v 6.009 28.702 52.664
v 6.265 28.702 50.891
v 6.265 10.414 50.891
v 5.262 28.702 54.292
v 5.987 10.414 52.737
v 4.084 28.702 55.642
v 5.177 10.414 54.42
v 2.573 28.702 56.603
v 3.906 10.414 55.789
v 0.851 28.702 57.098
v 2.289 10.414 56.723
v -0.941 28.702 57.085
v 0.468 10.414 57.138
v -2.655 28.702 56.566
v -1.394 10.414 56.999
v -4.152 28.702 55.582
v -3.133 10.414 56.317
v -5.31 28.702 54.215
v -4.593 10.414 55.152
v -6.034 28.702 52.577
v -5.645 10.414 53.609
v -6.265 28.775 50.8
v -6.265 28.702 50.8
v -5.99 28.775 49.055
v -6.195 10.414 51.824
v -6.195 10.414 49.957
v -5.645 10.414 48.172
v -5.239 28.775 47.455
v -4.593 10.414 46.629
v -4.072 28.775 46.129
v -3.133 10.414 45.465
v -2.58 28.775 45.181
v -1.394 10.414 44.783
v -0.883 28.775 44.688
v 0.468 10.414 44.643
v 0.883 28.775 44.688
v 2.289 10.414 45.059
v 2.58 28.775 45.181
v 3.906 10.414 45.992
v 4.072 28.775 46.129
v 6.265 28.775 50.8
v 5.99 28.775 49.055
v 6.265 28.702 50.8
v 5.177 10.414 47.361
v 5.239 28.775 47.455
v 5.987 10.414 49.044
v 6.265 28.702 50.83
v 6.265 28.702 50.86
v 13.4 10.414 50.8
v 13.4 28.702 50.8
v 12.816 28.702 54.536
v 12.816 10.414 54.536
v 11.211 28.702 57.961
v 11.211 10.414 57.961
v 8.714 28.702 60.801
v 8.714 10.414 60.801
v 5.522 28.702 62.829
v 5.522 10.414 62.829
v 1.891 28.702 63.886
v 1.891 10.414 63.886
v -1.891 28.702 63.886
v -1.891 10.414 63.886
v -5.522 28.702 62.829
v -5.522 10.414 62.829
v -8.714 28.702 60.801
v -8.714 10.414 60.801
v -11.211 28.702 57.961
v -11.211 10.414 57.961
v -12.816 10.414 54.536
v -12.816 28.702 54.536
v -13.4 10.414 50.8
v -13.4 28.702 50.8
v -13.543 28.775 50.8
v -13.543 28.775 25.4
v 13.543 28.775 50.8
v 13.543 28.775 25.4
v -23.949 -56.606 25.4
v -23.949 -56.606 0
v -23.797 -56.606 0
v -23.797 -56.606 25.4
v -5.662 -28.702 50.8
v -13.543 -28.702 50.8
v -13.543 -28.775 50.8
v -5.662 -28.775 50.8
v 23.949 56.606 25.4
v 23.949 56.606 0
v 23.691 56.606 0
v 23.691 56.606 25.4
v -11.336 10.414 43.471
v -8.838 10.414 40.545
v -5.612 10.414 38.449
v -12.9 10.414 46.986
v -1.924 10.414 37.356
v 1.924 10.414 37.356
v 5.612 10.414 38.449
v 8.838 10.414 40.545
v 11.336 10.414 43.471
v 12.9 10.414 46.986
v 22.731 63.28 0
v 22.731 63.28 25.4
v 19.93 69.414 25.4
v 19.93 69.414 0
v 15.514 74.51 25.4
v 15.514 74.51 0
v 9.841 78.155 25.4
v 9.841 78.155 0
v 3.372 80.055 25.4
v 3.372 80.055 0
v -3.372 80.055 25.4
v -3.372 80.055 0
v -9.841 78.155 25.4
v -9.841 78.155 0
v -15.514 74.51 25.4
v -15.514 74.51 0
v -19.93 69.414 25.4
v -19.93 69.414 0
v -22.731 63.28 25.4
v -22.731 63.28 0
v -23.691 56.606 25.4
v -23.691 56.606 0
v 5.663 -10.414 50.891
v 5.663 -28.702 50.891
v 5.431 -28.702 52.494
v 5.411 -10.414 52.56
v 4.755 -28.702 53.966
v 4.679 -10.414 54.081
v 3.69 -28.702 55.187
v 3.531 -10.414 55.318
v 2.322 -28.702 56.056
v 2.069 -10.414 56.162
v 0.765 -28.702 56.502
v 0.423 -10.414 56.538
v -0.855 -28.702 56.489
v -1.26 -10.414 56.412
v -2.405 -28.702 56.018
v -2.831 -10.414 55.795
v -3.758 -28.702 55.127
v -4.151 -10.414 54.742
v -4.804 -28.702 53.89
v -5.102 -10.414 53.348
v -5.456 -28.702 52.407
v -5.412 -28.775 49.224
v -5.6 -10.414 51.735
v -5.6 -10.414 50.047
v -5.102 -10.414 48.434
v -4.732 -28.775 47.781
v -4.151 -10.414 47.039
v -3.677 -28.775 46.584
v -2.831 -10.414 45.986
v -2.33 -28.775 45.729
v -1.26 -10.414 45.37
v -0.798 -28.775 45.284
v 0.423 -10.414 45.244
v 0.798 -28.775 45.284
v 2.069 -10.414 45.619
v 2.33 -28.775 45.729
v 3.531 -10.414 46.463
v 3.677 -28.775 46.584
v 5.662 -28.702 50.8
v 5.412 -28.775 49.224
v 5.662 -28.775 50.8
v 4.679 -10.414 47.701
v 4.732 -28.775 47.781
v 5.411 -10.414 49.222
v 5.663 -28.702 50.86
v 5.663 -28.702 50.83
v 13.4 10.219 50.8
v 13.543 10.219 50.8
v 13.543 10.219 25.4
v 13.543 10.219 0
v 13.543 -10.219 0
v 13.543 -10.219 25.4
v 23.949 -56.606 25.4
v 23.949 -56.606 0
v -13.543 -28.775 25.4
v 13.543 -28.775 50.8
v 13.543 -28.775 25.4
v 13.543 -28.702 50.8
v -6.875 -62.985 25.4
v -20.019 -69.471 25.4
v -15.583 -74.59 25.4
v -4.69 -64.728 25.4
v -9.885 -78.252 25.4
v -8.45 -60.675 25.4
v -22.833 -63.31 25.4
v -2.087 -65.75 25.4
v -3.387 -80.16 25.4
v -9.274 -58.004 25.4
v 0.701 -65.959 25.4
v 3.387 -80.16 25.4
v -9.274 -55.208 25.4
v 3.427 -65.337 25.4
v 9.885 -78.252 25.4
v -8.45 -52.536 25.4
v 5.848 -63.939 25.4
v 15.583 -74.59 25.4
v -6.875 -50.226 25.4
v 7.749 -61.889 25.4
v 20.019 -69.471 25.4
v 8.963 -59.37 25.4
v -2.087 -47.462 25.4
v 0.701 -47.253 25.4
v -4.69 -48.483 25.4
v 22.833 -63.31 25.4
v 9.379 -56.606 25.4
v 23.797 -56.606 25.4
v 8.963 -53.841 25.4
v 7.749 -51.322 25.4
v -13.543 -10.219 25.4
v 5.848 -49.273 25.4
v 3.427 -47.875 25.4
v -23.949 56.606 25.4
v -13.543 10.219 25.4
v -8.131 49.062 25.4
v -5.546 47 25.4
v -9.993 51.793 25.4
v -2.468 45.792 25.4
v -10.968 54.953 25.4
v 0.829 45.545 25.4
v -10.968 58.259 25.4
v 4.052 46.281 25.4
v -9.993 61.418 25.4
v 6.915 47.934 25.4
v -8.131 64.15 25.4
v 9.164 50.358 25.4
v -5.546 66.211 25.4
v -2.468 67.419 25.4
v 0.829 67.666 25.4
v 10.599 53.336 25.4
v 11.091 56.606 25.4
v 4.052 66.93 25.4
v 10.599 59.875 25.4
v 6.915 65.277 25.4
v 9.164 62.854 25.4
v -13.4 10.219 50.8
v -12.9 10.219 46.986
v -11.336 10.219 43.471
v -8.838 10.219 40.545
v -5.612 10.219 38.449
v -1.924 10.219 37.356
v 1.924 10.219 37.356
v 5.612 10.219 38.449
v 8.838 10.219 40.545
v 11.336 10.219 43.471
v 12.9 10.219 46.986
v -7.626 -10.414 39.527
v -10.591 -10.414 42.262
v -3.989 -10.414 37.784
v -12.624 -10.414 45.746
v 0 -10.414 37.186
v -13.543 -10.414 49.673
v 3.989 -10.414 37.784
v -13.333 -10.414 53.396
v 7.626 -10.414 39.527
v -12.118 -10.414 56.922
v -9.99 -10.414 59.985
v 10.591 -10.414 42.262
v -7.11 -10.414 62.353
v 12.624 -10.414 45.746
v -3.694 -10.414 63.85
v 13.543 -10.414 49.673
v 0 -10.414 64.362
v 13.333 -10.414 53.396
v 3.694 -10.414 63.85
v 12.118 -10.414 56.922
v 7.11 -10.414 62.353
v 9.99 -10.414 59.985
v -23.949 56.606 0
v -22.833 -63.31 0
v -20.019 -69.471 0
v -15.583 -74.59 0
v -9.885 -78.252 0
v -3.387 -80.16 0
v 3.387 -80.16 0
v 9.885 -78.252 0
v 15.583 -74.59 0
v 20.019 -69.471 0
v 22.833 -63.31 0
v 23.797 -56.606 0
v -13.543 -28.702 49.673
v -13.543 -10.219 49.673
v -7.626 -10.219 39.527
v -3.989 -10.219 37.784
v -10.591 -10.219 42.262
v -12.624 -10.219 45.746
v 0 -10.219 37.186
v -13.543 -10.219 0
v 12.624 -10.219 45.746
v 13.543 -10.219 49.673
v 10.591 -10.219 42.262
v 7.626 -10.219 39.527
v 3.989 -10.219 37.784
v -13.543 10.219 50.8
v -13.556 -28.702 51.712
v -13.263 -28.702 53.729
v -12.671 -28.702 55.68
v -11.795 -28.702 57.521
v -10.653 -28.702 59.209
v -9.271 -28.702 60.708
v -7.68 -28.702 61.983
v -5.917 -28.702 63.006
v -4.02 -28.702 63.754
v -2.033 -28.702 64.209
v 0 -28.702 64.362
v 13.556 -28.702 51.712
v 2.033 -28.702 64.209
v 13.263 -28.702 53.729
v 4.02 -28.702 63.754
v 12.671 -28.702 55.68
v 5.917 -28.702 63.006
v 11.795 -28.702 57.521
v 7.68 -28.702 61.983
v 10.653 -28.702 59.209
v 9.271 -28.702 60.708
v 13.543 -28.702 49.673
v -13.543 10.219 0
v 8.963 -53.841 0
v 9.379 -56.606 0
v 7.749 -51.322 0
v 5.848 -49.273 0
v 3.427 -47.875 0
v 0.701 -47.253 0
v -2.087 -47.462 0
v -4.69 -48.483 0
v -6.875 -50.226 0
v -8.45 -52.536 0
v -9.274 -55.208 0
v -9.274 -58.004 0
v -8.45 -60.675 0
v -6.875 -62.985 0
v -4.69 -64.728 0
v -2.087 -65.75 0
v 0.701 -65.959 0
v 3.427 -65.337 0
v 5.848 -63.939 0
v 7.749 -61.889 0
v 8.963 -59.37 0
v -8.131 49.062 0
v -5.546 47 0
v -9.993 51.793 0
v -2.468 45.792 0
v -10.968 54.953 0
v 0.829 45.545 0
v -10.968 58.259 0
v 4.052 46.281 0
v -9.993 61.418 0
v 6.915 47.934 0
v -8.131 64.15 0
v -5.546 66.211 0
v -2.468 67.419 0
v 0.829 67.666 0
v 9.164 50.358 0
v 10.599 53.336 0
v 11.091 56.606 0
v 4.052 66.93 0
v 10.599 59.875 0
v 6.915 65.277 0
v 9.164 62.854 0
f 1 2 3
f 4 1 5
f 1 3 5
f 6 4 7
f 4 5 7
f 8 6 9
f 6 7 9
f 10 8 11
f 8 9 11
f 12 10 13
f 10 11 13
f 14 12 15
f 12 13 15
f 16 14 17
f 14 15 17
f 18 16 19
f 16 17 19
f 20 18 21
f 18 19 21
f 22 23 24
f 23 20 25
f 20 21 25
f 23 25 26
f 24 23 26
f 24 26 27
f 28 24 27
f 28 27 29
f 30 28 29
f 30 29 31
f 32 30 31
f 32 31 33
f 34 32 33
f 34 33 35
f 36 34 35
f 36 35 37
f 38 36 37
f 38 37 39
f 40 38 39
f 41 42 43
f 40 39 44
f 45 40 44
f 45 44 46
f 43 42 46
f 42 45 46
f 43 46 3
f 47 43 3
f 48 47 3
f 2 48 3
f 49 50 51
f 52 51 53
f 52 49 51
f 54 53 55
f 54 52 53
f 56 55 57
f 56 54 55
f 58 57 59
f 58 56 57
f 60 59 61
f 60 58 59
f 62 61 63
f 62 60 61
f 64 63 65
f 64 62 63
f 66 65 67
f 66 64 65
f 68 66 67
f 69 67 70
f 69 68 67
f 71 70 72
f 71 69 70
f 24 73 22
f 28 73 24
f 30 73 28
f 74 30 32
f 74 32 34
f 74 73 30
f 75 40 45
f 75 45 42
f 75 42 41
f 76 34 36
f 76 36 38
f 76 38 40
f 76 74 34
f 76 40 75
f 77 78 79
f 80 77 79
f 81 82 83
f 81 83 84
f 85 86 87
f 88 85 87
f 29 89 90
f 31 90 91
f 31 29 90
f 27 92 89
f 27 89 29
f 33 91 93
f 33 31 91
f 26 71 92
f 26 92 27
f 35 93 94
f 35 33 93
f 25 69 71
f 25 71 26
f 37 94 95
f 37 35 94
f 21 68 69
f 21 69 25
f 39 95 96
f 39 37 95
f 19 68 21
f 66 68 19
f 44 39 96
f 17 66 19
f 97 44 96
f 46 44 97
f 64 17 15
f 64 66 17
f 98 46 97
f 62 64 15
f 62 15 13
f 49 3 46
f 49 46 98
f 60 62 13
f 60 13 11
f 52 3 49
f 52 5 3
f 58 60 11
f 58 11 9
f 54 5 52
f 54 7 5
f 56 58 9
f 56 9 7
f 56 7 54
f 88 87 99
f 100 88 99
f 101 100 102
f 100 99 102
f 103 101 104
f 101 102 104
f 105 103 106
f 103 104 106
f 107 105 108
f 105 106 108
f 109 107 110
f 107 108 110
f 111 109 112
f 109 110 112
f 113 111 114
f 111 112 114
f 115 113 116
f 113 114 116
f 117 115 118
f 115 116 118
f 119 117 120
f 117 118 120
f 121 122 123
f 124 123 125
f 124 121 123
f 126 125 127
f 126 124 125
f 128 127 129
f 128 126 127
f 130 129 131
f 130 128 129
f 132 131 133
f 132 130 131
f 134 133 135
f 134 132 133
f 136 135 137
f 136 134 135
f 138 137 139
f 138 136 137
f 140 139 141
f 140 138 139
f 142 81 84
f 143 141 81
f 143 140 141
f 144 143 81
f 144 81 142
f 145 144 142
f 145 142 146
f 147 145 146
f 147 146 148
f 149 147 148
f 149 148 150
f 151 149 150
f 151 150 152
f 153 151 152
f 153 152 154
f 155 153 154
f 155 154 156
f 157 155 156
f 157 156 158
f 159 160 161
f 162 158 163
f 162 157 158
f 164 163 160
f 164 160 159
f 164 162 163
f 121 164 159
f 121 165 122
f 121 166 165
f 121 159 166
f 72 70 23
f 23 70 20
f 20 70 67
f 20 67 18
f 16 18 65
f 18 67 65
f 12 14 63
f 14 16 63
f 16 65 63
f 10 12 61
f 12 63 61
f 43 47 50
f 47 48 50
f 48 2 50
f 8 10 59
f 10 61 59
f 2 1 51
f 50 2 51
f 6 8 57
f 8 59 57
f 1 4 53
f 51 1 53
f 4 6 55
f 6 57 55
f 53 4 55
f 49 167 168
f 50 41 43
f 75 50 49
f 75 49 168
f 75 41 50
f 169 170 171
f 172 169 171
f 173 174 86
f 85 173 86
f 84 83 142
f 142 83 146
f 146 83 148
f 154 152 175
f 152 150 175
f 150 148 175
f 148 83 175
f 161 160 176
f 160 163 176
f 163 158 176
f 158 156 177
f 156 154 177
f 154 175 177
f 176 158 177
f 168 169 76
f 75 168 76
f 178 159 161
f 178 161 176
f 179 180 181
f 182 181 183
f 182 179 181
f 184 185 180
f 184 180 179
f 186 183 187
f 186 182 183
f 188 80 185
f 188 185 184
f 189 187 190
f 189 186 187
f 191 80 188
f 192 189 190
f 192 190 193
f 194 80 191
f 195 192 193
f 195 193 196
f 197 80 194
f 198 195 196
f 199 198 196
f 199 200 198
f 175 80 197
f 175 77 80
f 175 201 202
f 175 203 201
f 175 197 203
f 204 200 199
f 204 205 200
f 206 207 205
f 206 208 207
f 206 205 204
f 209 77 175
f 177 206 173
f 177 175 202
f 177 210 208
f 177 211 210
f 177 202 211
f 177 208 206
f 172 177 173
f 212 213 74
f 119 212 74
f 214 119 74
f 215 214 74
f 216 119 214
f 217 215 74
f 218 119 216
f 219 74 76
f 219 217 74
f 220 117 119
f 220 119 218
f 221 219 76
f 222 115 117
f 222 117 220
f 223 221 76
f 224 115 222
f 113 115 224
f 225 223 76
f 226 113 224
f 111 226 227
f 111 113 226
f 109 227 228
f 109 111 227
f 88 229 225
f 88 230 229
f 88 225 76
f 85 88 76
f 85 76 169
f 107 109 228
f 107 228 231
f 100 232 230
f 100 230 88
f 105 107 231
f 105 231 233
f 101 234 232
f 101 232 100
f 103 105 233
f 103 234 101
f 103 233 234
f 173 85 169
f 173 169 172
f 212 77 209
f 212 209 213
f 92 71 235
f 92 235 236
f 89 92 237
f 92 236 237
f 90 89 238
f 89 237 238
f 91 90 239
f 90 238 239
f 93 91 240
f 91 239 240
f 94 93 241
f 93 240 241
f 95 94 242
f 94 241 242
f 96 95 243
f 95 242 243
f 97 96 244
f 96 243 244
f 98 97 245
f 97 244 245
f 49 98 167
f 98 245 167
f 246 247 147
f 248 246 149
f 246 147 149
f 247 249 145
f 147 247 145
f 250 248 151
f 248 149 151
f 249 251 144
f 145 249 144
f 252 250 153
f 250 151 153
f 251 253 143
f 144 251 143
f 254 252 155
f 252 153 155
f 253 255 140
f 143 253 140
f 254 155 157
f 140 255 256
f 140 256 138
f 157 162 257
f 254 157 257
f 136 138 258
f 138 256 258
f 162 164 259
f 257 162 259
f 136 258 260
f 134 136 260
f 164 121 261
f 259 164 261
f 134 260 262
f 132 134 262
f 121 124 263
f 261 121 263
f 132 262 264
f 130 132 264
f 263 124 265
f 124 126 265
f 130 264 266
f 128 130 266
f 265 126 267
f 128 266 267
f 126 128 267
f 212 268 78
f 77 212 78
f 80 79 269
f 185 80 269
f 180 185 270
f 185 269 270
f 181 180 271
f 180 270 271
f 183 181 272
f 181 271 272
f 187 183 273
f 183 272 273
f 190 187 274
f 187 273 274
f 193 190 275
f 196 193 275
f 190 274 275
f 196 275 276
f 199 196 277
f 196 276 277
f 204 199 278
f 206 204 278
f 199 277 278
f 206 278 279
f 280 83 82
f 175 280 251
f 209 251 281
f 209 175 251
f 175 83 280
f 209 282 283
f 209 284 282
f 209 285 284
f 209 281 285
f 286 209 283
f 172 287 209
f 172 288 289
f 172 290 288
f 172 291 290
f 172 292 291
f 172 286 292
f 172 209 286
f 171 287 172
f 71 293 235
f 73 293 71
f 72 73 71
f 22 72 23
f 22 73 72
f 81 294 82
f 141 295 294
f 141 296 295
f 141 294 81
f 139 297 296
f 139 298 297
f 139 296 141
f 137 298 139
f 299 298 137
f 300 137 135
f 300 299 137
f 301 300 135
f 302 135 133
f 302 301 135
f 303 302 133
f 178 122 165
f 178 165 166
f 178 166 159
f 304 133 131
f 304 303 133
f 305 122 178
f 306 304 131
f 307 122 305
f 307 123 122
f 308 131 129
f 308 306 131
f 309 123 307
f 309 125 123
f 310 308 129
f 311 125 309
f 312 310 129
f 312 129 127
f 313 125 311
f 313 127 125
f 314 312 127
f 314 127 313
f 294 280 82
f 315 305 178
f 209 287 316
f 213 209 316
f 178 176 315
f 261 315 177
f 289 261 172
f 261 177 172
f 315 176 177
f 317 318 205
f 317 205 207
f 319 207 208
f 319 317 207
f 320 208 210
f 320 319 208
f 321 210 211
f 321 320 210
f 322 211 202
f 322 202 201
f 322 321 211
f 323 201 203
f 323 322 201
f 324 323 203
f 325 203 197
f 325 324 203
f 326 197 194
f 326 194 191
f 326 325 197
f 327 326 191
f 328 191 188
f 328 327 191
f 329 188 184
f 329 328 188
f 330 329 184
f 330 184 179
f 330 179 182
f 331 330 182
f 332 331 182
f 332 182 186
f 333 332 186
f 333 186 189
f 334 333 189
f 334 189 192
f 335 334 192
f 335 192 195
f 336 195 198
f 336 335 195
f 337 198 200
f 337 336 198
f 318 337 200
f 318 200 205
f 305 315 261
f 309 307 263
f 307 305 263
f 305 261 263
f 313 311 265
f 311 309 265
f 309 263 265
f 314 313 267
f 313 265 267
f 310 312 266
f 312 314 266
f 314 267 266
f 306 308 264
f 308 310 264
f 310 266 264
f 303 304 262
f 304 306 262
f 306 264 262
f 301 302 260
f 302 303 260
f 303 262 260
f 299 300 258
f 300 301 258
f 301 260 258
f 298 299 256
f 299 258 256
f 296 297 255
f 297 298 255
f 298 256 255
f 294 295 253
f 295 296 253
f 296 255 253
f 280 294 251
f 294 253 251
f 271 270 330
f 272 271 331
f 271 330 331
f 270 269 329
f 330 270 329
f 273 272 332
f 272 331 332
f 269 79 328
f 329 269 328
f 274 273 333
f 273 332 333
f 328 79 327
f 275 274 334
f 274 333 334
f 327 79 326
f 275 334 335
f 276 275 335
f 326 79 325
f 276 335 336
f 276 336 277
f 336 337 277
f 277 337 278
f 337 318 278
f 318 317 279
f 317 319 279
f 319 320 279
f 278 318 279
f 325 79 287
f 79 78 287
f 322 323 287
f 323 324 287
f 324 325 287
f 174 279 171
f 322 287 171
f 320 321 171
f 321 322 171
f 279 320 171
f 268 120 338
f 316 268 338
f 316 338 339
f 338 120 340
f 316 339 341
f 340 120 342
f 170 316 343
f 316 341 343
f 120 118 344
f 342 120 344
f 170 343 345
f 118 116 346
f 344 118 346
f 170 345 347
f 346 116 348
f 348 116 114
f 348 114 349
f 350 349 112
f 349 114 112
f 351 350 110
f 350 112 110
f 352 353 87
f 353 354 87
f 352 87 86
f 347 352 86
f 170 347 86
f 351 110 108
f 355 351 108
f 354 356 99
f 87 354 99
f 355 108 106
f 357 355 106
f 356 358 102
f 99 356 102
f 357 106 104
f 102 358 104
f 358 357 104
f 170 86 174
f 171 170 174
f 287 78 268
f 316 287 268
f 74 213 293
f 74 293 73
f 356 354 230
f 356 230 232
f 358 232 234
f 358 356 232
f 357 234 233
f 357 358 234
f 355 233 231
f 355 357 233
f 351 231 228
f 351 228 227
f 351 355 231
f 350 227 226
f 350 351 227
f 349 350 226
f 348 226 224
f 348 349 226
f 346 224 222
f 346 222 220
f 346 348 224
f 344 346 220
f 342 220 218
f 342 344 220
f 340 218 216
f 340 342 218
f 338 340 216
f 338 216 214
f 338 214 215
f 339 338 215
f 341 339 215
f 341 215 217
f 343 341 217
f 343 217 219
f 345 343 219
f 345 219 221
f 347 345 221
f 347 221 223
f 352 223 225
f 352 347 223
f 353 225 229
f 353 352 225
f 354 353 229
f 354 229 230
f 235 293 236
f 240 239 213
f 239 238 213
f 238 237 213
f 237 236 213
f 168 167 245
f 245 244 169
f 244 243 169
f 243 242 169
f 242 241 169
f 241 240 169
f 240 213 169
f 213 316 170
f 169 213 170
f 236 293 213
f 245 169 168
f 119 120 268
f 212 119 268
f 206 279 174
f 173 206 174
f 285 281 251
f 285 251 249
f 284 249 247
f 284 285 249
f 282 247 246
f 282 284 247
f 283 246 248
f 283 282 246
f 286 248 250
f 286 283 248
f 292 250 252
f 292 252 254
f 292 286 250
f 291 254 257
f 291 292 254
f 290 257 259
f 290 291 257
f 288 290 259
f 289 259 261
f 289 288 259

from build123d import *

# Parameters (mm, degrees)
F0_W      = 27.0868334974
F0_H      = 18.5560942991
F1_DEPTH  = 50.8
F0_R      = 9.3791948403
F0_R_2    = 11.0914176542
F2_DEPTH  = 25.4
F3_R      = 13.588079422
F4_DEPTH  = 25.4
F5_DEPTH  = 13.208
F6_DEPTH  = 3.302
F7_DEPTH  = 10.414
F8_R      = 13.4014797698
F9_DEPTH  = 28.702
F10_DEPTH = 10.414
F11_R     = 6.2651990724
F12_DEPTH = 36.322
F13_R     = 5.6629254321
F14_DEPTH = 82.042


with BuildPart() as f1:
    # F0 (on Top) → F1 (new body)
    with BuildSketch(Plane.XY):
        with Locations((0, -19.4966302854)):
            Rectangle(F0_W, F0_H)
    extrude(amount=F1_DEPTH)



with BuildPart() as f1b:
    # F0 (on Top) → F1, piece 2 (new body)
    with BuildSketch(Plane.XY):
        with Locations((0, 19.4966302854)):
            Rectangle(F0_W, F0_H)
    extrude(amount=F1_DEPTH)


with BuildPart() as f1_1:
    add(f1.part)

    add(f1b.part)  # F2 merges F1b
    # F0 (on Top) → F2 (join)
    with BuildSketch(Plane.XY):
        with BuildLine():
            Line((23.7966101182, -56.6057153046), (23.9485707134, -56.6057153046))
            Line((23.9485707134, -56.6057153046), (23.9485707134, 56.6057153046))
            Line((23.9485707134, 56.6057153046), (23.6905010782, 56.6057153046))
            ThreePointArc((23.6905010782, 56.6057153046), (0, 80.2962163828), (-23.6905010782, 56.6057153046))
            Line((-23.6905010782, 56.6057153046), (-23.9485707134, 56.6057153046))
            Line((-23.9485707134, 56.6057153046), (-23.9485707134, -56.6057153046))
            Line((-23.9485707134, -56.6057153046), (-23.7966101182, -56.6057153046))
            ThreePointArc((-23.7966101182, -56.6057153046), (0, -80.4023254228), (23.7966101182, -56.6057153046))
        make_face()
        with Locations((0, -56.6057153046)):
            Circle(F0_R, mode=Mode.SUBTRACT)
        Polygon((-13.5434167487, 28.7746774349), (13.5434167487, 28.7746774349), (13.5434167487, 10.2185831358), (13.5434167487, -10.2185831358), (13.5434167487, -28.7746774349), (-13.5434167487, -28.7746774349), (-13.5434167487, -10.2185831358), (-13.5434167487, 10.2185831358), align=None, mode=Mode.SUBTRACT)
        with Locations((0, 56.6057153046)):
            Circle(F0_R_2, mode=Mode.SUBTRACT)
    extrude(amount=F2_DEPTH)

    # F3 (on Front) → F4 (join)
    with BuildSketch(Plane.XZ):
        with Locations((0, 50.7737323642)):
            Circle(F3_R)
    extrude(amount=F4_DEPTH)

    # F3 (on Front) → F5 (join)
    with BuildSketch(Plane.XZ):
        with Locations((0, 50.7737323642)):
            Circle(F3_R)
    extrude(amount=F5_DEPTH)

    # F6 (add): a face of the model
    f6_faces = [f1_1.faces().sort_by_distance(p)[0] for p in [
        (0, -25.4, 56.5534391302),
    ]]
    extrude(f6_faces, amount=F6_DEPTH)

    # F7 (cut): a face of the model
    f7_faces = [f1_1.faces().sort_by_distance(p)[0] for p in [
        (0, 0, 50.7737323642),
    ]]
    extrude(f7_faces, amount=-F7_DEPTH, mode=Mode.SUBTRACT)

    # F8 (on Front) → F9 (join)
    with BuildSketch(Plane.XZ):
        with Locations((0, 50.618570298)):
            Circle(F8_R)
    extrude(amount=-F9_DEPTH)

    # F10 (cut): a face of the model
    f10_faces = [f1_1.faces().sort_by_distance(p)[0] for p in [
        (0, 0, 50.618570298),
    ]]
    extrude(f10_faces, amount=-F10_DEPTH, mode=Mode.SUBTRACT)

    # F11 (on Front) → F12 (cut)
    with BuildSketch(Plane.XZ):
        with Locations((0, 50.8907139301)):
            Circle(F11_R)
    extrude(amount=-F12_DEPTH, mode=Mode.SUBTRACT)

    # F13 (on Front) → F14 (cut)
    with BuildSketch(Plane.XZ):
        with Locations((0, 50.8907139301)):
            Circle(F13_R)
    extrude(amount=F14_DEPTH, mode=Mode.SUBTRACT)


solid = f1_1.part
